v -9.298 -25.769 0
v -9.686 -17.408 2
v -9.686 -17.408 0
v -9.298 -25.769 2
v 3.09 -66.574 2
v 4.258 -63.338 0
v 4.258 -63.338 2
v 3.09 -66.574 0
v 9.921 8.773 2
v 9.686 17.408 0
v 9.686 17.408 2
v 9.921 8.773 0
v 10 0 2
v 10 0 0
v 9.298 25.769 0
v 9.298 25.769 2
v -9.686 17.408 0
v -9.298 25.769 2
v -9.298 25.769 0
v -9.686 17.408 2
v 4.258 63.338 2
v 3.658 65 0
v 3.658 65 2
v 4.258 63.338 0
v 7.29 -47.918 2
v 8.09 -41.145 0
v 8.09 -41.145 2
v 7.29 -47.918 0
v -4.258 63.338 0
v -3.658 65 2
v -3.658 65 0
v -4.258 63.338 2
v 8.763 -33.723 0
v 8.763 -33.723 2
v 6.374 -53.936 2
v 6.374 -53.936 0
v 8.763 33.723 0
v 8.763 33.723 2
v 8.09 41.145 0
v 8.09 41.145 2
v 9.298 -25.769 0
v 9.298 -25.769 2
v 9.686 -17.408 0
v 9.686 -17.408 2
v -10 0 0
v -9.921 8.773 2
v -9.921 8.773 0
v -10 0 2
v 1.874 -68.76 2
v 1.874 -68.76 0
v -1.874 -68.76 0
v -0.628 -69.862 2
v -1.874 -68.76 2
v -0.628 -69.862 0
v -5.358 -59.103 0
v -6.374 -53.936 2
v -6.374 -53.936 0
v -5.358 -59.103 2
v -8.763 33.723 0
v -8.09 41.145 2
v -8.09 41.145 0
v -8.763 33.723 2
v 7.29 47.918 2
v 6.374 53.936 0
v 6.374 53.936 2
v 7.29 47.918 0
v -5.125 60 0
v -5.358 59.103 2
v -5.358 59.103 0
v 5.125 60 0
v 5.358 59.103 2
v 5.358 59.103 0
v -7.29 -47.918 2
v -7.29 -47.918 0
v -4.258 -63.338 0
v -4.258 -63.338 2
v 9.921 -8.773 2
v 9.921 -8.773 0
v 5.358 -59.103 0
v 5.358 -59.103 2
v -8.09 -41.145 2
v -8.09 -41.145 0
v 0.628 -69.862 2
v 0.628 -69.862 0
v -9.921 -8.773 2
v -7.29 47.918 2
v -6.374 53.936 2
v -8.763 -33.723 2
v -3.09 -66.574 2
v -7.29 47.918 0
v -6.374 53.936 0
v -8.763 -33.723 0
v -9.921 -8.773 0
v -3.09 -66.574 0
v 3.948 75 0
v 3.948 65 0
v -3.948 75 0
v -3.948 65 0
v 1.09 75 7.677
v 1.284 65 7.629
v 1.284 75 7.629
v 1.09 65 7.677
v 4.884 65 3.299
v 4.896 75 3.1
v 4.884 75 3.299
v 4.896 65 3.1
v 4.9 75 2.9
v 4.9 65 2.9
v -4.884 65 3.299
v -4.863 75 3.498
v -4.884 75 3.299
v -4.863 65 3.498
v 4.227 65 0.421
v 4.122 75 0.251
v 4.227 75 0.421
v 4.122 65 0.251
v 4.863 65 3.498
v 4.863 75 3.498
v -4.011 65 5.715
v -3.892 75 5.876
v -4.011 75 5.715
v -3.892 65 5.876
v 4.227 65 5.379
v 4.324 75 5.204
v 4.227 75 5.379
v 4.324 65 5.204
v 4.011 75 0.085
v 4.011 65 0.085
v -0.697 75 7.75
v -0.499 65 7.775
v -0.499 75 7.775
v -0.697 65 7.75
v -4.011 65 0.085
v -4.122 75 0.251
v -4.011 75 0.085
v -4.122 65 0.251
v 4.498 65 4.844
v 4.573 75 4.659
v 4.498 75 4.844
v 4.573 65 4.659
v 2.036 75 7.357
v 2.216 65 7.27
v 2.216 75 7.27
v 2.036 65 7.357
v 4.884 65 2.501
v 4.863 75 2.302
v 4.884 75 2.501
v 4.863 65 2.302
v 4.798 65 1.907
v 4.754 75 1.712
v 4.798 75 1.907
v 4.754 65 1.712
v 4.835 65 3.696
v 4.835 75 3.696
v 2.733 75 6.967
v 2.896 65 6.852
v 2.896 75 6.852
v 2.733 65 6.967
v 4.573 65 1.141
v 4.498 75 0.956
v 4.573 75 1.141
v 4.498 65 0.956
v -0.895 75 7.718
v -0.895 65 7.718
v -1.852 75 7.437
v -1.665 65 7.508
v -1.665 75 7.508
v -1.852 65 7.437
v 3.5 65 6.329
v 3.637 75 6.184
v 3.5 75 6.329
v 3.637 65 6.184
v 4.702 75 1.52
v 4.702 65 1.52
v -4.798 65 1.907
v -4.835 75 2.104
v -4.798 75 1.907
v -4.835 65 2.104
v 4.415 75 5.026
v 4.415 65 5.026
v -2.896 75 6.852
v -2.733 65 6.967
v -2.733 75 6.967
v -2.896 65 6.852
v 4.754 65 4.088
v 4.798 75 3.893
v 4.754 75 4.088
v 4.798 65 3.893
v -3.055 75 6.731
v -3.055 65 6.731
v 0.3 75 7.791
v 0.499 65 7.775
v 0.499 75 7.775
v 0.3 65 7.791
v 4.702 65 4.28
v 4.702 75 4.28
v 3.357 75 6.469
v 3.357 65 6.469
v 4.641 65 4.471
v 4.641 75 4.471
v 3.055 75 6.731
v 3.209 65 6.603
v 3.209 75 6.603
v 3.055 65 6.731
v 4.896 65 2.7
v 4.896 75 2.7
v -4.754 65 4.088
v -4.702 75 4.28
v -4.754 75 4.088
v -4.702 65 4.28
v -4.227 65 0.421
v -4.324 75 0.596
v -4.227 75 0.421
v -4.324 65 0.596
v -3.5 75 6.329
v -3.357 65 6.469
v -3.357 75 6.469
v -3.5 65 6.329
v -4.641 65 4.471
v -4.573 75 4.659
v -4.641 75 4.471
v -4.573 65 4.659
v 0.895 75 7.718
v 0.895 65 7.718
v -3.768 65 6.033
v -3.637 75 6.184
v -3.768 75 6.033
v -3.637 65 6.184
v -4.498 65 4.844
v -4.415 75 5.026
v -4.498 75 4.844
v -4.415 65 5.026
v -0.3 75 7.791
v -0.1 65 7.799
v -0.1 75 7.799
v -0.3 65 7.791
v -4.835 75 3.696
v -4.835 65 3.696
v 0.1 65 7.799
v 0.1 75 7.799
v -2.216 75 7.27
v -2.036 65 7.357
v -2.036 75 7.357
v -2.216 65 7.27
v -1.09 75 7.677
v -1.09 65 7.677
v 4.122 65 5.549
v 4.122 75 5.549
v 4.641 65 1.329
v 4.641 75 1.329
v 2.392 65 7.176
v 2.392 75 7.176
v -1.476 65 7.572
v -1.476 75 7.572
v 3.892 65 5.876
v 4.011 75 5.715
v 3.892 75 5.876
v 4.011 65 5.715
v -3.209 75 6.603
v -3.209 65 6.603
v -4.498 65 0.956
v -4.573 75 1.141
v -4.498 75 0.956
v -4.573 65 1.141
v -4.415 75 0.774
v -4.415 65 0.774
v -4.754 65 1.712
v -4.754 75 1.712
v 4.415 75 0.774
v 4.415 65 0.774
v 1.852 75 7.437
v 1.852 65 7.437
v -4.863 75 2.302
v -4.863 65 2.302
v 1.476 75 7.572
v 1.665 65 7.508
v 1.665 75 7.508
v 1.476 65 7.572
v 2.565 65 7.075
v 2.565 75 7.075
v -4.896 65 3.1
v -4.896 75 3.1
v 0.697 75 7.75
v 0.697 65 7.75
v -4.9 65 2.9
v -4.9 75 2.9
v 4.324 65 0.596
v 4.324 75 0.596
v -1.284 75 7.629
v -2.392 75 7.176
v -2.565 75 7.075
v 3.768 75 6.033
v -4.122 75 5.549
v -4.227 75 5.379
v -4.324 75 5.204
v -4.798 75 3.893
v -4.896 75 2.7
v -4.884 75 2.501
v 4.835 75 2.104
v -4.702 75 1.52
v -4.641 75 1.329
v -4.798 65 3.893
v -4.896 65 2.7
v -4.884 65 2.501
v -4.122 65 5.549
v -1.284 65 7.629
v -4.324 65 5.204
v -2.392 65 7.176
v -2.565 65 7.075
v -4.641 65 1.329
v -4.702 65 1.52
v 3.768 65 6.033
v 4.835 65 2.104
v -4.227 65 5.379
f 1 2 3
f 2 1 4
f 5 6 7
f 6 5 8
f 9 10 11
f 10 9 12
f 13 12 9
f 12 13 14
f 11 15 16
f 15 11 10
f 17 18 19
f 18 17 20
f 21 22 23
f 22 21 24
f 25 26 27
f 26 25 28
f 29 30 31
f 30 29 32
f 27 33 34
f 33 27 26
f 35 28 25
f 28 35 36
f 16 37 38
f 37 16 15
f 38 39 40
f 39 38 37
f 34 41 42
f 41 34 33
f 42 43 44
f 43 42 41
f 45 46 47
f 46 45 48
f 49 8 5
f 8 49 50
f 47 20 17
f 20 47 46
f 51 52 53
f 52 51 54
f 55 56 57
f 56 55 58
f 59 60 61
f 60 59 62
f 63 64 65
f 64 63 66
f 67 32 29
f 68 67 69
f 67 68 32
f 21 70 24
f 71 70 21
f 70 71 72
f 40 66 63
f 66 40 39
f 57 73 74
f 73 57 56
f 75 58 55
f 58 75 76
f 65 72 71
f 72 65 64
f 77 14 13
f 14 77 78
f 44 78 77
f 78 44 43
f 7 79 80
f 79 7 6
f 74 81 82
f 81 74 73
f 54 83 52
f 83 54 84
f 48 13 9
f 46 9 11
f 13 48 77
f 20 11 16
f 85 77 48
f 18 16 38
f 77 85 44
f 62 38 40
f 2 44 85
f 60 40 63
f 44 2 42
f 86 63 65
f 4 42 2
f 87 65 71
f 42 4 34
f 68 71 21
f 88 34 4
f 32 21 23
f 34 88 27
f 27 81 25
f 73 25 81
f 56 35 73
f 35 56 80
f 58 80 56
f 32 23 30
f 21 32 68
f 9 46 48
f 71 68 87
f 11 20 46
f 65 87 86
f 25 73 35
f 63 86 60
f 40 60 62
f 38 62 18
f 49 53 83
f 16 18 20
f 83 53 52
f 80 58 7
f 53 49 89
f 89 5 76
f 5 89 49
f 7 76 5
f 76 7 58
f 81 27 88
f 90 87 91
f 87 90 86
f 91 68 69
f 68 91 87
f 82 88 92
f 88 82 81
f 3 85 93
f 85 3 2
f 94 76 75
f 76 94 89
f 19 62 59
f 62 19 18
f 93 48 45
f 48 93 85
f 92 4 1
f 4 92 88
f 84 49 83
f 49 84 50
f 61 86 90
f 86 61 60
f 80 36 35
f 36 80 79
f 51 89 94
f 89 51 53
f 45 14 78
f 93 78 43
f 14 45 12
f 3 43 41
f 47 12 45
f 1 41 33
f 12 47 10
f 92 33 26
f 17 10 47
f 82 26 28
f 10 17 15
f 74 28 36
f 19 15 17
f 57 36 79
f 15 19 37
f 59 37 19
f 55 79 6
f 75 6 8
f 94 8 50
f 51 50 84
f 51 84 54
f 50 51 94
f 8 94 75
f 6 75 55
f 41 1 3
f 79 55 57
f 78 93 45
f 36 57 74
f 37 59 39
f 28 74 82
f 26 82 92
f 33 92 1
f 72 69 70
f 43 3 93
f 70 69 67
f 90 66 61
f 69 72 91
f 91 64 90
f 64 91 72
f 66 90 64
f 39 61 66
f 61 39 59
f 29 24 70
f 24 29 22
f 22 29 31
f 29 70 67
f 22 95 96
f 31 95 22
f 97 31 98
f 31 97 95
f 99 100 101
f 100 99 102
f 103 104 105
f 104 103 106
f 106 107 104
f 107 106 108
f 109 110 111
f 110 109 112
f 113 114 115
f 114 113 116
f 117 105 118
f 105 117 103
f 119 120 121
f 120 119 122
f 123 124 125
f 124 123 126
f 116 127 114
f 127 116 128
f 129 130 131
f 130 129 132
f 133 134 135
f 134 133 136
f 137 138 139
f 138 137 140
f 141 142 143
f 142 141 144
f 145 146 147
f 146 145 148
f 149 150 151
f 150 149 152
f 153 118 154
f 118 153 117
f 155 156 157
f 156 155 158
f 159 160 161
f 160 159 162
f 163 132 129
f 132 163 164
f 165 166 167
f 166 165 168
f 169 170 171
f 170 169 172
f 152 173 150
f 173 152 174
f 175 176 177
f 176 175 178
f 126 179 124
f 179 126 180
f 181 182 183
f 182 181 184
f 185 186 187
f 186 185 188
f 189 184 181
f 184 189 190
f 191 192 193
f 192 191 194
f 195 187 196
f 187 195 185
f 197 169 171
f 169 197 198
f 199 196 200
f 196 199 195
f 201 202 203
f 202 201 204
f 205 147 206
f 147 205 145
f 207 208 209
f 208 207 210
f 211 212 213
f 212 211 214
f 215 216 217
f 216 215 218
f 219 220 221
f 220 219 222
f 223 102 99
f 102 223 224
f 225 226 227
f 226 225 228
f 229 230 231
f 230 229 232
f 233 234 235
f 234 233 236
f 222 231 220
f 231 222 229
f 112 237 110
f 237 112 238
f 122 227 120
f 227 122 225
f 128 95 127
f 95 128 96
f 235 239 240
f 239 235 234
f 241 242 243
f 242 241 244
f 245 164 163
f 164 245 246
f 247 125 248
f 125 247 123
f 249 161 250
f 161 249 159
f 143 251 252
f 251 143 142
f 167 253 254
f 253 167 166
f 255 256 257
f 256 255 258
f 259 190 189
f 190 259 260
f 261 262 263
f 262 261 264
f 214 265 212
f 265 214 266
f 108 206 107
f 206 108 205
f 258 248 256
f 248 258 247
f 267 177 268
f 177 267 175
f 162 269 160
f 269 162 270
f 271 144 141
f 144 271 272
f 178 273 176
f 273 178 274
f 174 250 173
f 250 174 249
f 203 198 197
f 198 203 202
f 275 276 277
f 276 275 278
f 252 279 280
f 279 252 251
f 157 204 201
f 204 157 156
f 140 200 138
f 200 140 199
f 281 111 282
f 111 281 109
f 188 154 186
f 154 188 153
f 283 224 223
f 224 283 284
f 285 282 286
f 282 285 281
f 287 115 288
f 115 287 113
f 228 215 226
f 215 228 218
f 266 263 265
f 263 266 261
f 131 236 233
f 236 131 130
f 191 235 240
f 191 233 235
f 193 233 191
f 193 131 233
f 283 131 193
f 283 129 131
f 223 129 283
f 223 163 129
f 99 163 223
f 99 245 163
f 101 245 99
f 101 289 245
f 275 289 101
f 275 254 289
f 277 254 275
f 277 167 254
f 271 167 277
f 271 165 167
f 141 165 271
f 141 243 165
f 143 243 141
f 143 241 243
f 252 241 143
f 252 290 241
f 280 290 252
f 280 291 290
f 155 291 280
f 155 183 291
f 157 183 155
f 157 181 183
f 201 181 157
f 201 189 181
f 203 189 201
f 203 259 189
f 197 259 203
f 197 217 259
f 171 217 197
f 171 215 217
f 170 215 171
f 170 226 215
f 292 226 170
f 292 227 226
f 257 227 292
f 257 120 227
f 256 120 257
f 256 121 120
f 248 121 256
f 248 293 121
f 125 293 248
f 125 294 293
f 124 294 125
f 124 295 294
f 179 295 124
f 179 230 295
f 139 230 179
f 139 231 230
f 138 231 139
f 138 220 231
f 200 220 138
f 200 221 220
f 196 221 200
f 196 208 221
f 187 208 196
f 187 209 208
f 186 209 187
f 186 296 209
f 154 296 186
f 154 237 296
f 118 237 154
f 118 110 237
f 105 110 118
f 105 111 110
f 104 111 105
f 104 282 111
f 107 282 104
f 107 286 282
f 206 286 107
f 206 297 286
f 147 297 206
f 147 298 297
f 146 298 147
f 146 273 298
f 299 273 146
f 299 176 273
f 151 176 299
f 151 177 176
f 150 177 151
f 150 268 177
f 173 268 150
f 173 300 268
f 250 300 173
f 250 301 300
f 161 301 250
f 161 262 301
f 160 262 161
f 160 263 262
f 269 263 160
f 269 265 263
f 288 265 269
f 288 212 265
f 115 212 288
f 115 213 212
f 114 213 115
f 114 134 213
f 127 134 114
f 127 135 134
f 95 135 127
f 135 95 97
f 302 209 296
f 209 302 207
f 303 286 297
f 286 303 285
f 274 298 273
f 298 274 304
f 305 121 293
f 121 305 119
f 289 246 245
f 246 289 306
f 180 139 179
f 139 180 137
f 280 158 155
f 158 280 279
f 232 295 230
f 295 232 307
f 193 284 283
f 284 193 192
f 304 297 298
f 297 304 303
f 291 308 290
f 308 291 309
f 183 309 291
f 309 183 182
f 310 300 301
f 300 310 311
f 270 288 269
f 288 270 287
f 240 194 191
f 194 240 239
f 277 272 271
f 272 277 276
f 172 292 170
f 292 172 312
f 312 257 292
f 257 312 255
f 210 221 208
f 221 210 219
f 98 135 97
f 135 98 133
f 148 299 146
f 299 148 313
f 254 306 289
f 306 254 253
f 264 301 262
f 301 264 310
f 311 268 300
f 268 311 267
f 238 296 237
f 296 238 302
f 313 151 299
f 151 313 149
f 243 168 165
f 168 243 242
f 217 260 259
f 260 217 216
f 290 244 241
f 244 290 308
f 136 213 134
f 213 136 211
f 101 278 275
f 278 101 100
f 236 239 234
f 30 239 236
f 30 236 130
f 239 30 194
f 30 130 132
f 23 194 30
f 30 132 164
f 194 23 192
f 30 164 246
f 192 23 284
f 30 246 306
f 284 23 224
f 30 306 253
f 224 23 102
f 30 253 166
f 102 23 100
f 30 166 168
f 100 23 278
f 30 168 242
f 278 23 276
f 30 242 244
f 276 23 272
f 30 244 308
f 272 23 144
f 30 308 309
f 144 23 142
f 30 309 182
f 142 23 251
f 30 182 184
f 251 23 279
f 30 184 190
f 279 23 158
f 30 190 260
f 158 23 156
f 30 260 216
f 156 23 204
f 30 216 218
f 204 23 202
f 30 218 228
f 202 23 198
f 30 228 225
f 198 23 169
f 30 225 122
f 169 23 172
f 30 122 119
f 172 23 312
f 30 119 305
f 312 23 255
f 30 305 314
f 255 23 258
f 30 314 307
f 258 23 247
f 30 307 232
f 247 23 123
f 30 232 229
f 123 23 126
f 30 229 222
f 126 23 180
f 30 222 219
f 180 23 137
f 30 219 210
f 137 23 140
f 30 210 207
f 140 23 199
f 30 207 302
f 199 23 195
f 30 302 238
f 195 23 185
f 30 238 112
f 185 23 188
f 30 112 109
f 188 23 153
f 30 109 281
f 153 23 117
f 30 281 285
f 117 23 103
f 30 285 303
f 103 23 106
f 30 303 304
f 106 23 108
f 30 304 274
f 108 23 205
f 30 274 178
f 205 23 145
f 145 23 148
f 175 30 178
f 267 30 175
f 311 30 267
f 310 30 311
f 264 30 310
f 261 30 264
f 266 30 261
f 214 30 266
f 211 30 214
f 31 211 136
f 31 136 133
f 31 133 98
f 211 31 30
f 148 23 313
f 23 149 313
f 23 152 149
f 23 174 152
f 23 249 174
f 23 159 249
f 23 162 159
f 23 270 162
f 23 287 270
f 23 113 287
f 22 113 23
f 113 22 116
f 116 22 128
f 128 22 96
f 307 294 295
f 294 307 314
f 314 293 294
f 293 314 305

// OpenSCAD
/*
 * Copyright (C) 2026 Fluid Flame (fluidflame@fluidflame.org)
 *
 * This program is free software: you can redistribute it and/or modify
 * it under the terms of the GNU General Public License as published by
 * the Free Software Foundation, either version 3 of the License, or
 * (at your option) any later version.
 *
 * This program is distributed in the hope that it will be useful,
 * but WITHOUT ANY WARRANTY; without even the implied warranty of
 * MERCHANTABILITY or FITNESS FOR A PARTICULAR PURPOSE.
 * See the GNU General Public License for more details.
 *
 * You should have received a copy of the GNU General Public License
 * along with this program. If not, see <https://www.gnu.org/licenses/>.
 */
$fa = $preview ? 12 : 1;
$fs = $preview ? 2 : 0.2;

thickness = 2;
label_height = 10;
label_width = 70;

post_height = 10;
post_radius = 4.9;

difference() {
    union() {
        scale([label_height, label_width, 1])
            cylinder(h=thickness, r=1, $fn=50);
        translate([0, label_width+post_height/2, post_radius-thickness])
            rotate([90, 0, 0])
                cylinder(h=post_height, r=post_radius);
    }
    translate([0, label_width, -thickness])
        #cube([post_height*2, post_height*2, thickness*2], center=true);
}
